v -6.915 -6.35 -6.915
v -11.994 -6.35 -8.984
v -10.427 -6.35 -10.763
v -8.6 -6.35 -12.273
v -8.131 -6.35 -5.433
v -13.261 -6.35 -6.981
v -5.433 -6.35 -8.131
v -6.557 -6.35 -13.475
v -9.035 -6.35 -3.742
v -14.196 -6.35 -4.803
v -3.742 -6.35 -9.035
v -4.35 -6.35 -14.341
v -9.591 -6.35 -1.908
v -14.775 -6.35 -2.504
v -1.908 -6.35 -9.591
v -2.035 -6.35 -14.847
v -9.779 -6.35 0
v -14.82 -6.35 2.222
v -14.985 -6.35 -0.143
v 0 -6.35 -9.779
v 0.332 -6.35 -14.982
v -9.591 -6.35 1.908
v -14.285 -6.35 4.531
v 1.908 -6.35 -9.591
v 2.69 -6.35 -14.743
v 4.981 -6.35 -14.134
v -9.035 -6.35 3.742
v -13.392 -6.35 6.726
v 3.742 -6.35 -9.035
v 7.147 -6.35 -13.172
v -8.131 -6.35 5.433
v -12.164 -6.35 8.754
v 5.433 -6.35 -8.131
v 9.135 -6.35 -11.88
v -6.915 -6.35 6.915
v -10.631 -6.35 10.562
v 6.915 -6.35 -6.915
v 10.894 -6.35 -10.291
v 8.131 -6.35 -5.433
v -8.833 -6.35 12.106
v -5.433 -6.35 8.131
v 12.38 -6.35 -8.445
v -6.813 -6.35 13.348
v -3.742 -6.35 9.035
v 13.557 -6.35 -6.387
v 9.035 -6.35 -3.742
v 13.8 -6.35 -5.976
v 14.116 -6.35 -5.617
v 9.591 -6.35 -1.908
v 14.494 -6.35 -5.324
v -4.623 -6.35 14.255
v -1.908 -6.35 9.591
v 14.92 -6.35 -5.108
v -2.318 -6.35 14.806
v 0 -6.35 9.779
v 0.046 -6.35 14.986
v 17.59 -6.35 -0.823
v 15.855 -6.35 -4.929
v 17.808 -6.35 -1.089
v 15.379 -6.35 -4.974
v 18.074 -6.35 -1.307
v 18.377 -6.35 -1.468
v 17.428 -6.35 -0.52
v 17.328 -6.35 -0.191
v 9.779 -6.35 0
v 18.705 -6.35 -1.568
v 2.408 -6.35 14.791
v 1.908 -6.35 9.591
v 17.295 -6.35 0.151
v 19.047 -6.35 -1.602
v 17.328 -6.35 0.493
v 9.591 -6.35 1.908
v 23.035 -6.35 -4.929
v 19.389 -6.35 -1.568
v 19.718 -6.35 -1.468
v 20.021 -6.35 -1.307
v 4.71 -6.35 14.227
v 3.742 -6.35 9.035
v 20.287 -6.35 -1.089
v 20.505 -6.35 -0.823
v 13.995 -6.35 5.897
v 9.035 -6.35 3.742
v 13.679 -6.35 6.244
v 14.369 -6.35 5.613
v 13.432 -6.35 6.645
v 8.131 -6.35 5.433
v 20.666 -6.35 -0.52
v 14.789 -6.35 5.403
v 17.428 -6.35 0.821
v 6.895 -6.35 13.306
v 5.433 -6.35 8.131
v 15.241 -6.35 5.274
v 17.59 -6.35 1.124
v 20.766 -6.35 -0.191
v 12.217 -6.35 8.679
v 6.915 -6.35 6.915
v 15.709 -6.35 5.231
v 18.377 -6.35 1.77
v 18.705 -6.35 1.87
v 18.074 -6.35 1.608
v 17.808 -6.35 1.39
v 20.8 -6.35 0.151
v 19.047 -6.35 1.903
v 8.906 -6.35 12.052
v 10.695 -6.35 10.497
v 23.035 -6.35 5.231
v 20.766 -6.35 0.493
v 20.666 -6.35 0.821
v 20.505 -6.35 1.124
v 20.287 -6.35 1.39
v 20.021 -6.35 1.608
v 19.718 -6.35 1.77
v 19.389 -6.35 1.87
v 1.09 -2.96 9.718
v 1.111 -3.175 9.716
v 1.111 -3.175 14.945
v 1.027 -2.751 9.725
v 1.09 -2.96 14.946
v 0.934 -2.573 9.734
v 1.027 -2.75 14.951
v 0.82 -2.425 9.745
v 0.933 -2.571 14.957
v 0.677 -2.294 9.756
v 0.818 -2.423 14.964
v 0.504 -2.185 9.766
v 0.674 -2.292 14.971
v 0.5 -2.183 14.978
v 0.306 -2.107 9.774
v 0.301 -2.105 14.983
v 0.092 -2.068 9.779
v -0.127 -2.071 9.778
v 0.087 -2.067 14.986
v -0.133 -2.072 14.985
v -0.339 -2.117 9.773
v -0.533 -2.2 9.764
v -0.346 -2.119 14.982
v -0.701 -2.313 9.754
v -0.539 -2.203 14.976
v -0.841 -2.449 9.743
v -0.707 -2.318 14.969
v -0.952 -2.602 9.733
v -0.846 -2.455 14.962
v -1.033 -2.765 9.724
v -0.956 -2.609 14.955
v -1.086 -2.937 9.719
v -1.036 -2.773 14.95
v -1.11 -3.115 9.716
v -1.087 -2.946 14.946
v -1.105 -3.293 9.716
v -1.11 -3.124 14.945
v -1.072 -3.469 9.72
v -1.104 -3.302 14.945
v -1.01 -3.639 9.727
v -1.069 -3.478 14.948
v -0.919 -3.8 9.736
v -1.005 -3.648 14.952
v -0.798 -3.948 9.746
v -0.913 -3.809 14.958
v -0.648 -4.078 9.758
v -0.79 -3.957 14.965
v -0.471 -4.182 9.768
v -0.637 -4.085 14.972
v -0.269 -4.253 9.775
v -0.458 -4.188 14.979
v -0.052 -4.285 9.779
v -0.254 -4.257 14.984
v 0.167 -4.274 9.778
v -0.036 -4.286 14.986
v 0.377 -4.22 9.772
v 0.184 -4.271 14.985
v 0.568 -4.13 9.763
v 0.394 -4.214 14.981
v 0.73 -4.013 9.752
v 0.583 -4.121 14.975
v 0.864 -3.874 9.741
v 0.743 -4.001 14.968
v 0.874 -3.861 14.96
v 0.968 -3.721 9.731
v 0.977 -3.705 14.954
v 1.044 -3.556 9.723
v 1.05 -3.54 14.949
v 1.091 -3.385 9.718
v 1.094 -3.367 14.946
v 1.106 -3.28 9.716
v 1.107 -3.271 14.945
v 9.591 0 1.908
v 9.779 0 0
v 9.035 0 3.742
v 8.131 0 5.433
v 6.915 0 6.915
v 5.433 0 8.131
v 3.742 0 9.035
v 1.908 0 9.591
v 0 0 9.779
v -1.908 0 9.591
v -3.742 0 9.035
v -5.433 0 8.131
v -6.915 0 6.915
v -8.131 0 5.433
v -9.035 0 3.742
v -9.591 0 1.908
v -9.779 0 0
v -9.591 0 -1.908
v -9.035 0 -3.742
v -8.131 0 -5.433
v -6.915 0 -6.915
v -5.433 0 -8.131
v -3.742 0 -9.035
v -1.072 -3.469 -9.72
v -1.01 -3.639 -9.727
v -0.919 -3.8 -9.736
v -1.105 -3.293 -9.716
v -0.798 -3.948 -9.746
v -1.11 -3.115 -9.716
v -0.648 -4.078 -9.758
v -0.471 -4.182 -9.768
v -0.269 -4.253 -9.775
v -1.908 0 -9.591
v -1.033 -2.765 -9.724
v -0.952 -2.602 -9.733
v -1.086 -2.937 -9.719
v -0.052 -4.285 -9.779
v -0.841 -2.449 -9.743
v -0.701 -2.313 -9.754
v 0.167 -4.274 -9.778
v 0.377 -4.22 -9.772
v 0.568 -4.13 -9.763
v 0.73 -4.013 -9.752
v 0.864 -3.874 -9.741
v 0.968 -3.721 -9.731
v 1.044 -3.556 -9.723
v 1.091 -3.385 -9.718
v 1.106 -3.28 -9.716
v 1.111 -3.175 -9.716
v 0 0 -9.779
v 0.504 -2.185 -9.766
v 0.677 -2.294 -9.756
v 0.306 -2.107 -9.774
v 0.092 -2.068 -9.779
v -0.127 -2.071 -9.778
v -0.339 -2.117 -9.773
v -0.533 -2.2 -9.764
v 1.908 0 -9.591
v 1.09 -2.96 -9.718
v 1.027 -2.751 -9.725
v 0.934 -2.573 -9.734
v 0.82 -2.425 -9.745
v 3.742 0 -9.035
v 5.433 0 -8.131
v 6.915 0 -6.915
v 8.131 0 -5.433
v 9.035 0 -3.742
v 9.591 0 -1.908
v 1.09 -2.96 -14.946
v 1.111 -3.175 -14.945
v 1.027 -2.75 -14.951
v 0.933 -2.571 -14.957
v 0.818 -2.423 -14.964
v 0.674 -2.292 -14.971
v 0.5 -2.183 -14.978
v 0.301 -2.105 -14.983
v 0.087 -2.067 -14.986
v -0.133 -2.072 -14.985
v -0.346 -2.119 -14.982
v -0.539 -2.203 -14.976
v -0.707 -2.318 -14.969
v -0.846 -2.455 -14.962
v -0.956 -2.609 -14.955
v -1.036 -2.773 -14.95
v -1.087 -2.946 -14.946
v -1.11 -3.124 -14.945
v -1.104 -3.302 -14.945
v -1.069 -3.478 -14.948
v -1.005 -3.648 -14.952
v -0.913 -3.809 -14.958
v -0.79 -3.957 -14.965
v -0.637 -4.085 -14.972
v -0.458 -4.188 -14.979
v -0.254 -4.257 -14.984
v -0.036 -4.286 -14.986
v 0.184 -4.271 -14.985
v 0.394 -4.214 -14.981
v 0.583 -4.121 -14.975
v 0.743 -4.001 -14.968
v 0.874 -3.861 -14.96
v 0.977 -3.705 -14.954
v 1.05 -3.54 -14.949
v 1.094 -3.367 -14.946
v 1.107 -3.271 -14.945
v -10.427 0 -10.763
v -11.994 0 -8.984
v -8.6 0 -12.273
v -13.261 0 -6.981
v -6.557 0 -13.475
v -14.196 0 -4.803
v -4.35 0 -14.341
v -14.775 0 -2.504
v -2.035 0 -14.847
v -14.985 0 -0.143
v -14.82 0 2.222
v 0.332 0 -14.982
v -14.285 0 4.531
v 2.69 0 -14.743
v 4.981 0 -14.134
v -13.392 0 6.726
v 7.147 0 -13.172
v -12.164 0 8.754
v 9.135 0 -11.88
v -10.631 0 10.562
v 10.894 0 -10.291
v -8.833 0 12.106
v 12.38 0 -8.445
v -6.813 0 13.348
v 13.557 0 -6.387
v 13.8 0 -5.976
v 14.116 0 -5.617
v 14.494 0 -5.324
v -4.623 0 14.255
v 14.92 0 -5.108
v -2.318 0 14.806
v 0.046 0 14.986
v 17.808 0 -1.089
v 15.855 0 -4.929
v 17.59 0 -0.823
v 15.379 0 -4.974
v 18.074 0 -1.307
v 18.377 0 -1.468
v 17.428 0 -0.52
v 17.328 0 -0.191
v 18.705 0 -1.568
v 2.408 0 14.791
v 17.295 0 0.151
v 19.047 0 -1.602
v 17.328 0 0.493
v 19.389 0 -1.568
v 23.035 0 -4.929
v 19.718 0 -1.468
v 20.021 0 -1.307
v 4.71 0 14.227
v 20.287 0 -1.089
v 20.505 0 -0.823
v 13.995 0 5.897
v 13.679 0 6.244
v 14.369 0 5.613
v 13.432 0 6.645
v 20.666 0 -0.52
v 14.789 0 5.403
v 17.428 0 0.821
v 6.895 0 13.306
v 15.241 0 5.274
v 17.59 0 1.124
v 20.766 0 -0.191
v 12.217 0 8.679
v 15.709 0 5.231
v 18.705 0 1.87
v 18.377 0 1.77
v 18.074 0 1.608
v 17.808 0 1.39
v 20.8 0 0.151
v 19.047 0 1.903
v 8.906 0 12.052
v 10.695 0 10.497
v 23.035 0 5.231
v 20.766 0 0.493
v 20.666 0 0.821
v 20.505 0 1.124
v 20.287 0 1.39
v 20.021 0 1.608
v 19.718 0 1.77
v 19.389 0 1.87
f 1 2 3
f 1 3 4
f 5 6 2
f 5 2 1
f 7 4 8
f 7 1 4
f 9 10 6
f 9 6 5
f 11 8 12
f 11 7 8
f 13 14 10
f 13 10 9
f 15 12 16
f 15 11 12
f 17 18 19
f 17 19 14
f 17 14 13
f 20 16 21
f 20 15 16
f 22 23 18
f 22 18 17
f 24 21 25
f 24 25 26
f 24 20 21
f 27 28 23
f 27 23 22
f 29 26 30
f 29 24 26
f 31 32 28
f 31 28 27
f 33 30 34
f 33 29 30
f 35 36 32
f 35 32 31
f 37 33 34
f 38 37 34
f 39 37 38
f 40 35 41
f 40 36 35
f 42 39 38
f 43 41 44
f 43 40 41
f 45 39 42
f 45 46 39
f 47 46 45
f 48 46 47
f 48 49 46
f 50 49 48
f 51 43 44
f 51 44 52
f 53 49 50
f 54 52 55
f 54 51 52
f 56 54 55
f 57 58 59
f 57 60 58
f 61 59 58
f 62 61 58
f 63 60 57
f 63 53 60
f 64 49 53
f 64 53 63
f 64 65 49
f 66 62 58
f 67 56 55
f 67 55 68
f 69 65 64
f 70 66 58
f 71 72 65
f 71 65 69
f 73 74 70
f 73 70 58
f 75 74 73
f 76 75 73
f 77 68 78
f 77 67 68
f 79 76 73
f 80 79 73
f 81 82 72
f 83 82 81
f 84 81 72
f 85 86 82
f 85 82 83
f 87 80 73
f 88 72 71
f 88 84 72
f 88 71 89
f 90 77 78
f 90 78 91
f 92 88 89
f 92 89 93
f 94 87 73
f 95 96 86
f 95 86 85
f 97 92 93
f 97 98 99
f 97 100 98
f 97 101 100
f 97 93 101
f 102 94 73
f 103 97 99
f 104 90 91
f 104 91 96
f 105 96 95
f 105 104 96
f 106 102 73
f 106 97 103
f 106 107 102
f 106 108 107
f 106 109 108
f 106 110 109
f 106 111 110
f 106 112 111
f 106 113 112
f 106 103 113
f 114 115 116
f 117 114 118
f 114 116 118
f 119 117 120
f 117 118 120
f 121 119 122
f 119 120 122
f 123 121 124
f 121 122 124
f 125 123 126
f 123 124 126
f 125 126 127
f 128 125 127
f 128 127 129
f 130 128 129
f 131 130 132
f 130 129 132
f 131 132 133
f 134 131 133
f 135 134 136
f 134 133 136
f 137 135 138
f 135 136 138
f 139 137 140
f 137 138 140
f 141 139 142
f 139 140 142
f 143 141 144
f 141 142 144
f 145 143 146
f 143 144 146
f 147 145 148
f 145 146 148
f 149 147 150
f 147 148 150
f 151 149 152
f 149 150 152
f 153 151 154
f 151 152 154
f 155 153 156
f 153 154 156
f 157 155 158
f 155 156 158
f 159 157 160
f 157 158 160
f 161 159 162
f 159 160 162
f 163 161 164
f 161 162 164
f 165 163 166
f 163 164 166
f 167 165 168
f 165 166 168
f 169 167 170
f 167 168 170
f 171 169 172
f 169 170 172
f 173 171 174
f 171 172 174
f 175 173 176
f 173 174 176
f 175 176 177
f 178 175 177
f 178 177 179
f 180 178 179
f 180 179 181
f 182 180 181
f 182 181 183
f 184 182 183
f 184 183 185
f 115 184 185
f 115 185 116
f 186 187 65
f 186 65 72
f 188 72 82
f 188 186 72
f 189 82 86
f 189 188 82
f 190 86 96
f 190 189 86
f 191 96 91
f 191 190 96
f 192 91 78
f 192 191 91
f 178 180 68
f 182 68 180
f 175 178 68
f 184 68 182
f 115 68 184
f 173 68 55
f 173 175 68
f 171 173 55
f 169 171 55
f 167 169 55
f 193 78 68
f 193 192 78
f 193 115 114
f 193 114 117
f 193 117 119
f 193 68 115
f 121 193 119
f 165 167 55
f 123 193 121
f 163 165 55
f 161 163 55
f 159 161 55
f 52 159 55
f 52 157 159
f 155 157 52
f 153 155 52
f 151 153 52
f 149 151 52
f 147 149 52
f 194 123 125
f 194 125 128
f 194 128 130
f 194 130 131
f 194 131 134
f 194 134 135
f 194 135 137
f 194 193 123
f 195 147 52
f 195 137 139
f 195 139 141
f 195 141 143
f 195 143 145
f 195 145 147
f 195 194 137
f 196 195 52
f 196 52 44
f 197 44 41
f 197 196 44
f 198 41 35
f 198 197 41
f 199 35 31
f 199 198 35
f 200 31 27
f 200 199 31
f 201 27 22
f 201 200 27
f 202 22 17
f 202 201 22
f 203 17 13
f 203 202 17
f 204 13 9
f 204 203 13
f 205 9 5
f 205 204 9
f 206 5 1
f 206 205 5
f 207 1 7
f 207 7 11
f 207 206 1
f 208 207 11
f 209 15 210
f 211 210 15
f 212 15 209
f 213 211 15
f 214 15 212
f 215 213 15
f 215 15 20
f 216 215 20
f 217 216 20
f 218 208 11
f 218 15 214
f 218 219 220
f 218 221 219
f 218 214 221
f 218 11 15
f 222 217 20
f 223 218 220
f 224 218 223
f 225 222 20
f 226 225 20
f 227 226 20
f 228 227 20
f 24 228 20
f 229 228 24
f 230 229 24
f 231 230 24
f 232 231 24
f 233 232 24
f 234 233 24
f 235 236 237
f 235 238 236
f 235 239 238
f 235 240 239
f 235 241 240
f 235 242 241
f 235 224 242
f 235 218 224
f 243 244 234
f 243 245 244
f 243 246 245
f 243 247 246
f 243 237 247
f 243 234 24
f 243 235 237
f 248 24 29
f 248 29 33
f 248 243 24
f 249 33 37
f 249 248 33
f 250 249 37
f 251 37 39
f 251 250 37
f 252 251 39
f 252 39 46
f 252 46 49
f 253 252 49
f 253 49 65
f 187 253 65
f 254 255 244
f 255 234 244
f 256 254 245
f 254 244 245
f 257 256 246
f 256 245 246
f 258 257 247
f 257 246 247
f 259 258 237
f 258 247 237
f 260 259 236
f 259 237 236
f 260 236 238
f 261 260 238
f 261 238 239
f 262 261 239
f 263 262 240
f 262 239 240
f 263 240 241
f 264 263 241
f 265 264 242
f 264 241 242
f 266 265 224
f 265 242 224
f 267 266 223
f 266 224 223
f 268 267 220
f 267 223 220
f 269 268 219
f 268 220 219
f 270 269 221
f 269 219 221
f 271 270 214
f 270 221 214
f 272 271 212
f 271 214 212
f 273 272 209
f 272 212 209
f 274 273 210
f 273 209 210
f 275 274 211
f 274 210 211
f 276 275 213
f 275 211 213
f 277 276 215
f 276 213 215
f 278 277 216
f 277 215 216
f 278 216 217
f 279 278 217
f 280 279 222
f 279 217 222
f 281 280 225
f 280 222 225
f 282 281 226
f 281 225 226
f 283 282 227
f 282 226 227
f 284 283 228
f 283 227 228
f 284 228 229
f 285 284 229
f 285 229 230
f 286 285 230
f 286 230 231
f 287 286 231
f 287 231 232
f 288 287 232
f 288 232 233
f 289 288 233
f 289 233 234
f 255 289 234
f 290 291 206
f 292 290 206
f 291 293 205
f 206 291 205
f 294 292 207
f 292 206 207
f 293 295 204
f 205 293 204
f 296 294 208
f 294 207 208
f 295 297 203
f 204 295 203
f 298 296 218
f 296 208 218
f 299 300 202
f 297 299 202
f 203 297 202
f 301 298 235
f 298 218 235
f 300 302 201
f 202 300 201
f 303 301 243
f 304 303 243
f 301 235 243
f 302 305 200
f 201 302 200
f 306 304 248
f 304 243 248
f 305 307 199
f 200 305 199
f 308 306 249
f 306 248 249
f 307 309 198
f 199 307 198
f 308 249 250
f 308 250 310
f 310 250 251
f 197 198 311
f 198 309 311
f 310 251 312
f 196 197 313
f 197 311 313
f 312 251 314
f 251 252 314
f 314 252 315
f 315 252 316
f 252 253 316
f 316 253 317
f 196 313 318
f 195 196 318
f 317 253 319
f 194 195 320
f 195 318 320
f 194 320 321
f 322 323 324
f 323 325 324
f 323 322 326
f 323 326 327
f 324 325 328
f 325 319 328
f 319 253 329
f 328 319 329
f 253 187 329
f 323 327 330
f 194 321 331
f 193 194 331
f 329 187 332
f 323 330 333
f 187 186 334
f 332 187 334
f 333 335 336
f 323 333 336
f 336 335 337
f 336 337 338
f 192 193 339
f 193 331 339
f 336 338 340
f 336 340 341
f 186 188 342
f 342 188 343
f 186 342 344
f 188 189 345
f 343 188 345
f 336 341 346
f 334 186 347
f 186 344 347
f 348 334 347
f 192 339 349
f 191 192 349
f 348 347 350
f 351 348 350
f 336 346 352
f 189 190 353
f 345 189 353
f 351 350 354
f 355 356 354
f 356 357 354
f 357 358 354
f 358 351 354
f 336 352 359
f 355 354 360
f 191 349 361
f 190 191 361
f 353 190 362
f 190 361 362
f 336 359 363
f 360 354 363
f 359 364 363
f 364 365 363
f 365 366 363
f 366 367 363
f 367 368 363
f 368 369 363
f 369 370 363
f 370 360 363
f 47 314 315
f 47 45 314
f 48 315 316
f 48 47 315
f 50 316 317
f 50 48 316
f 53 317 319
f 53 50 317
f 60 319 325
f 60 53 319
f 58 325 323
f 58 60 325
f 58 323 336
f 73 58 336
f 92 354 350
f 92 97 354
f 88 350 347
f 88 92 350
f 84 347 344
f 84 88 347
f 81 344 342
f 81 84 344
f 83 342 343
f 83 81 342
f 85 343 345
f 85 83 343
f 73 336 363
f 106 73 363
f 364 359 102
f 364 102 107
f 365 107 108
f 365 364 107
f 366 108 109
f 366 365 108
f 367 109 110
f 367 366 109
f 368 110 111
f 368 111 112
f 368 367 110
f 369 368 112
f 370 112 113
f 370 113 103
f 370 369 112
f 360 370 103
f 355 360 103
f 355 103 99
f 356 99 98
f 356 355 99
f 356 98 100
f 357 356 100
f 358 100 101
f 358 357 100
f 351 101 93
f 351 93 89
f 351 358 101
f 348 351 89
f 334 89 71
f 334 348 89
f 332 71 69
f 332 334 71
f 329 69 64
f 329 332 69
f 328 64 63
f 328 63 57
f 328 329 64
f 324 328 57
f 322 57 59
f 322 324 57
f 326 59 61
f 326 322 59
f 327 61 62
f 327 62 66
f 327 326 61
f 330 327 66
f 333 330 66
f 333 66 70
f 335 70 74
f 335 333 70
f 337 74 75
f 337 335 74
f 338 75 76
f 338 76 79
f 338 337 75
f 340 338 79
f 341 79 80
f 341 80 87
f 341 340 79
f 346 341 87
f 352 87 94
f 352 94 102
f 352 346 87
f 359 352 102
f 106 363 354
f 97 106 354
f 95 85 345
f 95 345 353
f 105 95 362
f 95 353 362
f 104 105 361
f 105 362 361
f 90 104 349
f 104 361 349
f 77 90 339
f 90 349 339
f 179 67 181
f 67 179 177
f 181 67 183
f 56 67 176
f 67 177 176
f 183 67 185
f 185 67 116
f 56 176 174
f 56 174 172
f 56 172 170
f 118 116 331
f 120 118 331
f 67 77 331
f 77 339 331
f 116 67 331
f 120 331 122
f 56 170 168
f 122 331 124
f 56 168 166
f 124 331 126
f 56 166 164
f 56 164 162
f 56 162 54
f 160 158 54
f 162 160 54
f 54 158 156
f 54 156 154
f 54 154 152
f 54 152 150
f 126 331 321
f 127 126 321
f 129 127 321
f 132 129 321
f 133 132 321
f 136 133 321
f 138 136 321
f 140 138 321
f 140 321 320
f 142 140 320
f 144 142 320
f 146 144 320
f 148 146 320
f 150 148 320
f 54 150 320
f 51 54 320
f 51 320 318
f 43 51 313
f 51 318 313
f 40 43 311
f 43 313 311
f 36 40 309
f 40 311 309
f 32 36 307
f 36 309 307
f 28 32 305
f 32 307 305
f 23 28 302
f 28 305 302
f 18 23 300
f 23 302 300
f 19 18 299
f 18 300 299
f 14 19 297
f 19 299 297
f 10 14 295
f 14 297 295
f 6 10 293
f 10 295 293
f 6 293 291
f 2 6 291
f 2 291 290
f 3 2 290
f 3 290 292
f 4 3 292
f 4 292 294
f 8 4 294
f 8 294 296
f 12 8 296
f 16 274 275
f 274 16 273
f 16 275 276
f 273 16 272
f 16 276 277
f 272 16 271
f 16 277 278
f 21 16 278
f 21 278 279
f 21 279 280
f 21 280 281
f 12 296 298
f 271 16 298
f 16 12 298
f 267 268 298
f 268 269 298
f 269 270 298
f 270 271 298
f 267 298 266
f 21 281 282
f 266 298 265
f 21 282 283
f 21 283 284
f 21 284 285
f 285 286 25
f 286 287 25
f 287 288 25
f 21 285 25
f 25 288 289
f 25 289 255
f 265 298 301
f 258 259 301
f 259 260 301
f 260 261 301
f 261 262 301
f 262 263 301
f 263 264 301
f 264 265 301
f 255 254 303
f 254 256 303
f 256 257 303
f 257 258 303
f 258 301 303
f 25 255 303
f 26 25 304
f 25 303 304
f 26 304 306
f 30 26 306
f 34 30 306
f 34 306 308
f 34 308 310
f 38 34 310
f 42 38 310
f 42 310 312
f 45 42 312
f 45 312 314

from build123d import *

# Parameters (mm, degrees)
F0_R     = 1.7526
F0_R_2   = 9.779
F1_DEPTH = 6.35
F2_R     = 1.11125
F3_DEPTH = 25.4
F4_R     = 2.54
F5_R     = 2.54


with BuildPart() as f1:
    # F0 (on Front) → F1 (new body)
    with BuildSketch(Plane.XZ):
        with BuildLine():
            ThreePointArc((14.1521138842, -4.9292868255), (14.7760579092, -2.4996617102), (14.986, 0))
            ThreePointArc((14.986, 0), (14.7484924114, 2.6574739115), (14.0434979861, 5.2307131745))
            Line((14.0434979861, 5.2307131745), (14.0434979861, -4.9292868255))
            Line((14.0434979861, -4.9292868255), (14.1521138842, -4.9292868255))
        make_face()
        with BuildLine():
            ThreePointArc((14.0434979861, 5.2307131745), (14.7484924114, 2.6574739115), (14.986, 0))
            ThreePointArc((14.986, 0), (14.7760579092, -2.4996617102), (14.1521138842, -4.9292868255))
            Line((14.1521138842, -4.9292868255), (23.0350979861, -4.9292868255))
            Line((23.0350979861, -4.9292868255), (23.0350979861, 5.2307131745))
            Line((23.0350979861, 5.2307131745), (14.0434979861, 5.2307131745))
        make_face()
        with Locations((19.0472979861, 0.1507131745)):
            Circle(F0_R, mode=Mode.SUBTRACT)
        with BuildLine():
            Line((14.0434979861, -4.9292868255), (14.0434979861, 5.2307131745))
            ThreePointArc((14.0434979861, 5.2307131745), (-14.9851437159, -0.1601992956), (14.1521138842, -4.9292868255))
            Line((14.1521138842, -4.9292868255), (14.0434979861, -4.9292868255))
        make_face()
        Circle(F0_R_2, mode=Mode.SUBTRACT)
    extrude(amount=F1_DEPTH)

    # F2 (on Top) → F3 (cut, symmetric)
    with BuildSketch(Plane.XY):
        with Locations((0, -3.175)):
            Circle(F2_R)
    extrude(amount=F3_DEPTH, both=True, mode=Mode.SUBTRACT)

    # F4
    f4_edges = [f1.edges().sort_by_distance(p)[0] for p in [
        (14.043498, -3.175, 5.230713),
    ]]
    fillet(f4_edges, radius=F4_R)

    # F5
    f5_edges = [f1.edges().sort_by_distance(p)[0] for p in [
        (14.152114, -3.175, -4.929287),
    ]]
    fillet(f5_edges, radius=F5_R)


solid = f1.part
